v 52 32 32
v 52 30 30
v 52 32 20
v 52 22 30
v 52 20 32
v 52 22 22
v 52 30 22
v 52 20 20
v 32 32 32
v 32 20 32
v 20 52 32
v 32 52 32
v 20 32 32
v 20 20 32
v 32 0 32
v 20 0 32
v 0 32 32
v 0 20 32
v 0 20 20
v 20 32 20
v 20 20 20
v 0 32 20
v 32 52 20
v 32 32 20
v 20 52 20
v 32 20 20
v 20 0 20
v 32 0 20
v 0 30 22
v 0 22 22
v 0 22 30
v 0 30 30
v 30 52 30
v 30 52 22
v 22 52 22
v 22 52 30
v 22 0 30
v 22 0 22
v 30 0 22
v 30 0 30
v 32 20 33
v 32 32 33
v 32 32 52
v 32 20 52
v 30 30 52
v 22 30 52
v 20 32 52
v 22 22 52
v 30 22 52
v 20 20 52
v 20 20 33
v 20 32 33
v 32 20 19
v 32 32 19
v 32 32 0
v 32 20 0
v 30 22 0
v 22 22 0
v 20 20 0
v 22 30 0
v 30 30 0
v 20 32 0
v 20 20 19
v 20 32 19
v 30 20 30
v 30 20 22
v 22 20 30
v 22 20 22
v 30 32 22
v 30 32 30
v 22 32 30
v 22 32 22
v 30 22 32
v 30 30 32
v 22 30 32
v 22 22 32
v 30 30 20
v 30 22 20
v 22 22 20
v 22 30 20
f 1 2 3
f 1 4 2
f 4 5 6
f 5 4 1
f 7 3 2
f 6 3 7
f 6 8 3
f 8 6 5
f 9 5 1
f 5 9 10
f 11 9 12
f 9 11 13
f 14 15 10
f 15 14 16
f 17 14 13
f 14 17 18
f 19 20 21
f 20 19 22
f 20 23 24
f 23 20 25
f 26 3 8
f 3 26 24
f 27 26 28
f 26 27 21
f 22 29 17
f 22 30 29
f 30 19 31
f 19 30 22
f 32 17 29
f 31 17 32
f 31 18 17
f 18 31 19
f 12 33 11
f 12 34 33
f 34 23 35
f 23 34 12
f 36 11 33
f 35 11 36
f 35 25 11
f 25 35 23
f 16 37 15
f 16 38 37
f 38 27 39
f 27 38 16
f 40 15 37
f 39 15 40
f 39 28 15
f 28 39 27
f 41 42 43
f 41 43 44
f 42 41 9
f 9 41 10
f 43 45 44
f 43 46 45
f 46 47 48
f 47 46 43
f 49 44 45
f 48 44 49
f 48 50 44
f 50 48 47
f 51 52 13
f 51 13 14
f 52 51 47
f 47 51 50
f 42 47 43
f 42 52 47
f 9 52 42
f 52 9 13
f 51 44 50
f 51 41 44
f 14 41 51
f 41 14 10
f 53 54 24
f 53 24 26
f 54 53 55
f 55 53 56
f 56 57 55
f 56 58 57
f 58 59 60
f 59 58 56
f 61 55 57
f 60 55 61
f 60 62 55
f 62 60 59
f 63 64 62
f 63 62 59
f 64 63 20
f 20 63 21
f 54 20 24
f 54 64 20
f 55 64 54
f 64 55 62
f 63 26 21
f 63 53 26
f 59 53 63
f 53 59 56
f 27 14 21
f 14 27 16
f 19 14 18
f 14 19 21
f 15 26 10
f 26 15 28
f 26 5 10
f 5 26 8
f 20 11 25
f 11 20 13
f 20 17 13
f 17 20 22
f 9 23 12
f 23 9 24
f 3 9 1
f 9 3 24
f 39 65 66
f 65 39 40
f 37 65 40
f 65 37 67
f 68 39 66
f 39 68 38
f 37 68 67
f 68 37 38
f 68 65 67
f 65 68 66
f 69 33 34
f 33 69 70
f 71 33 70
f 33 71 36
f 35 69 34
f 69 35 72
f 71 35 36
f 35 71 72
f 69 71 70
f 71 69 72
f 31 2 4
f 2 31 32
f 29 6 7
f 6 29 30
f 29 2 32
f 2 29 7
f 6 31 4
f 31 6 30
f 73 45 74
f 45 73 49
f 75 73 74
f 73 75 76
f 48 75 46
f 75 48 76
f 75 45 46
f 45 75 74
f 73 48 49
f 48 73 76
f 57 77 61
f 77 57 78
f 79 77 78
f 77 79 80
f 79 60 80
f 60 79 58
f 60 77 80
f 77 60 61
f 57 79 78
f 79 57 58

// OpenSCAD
/* 
 * Universal connectors generator - rectangular version
 * See connectors type to choose from
 * all units are in milimeters
 *
 * author R. A. - 2015/12/01
 * e-mail: thingiverse@dexter.sk
 * Thingiverse username: dexterko
 *
 * Feel free to modify and distribute, but please keep the credits;-)
 */
    
    
outer_width = 12;
hole_width = 8;
connect_length = 20;
connector_type = "XX_conn"; // [I_conn:Bare I connector - 2 connects, L_conn:Flat L connector - 2 connects, T_conn:Flat T connector - 3 connects, X_conn:Flat X connector - 4 connects, LL_conn:Edge Connector - 3 connects, TT_conn:T Connector with side connect - 4 connects, XT_conn:X Connector with  side-connect - 5 connects, XX_conn:full 3D Cross Connector - 6 connects]

if (connector_type == "I_conn") {
    I_conn(outer_width, hole_width, connect_length);
} else if (connector_type == "L_conn") {
    L_conn(outer_width, hole_width, connect_length);
} else if (connector_type == "T_conn") {
    T_conn(outer_width, hole_width, connect_length);
} else if (connector_type == "X_conn") {
    X_conn(outer_width, hole_width, connect_length);
} else if (connector_type == "LL_conn") {
    LL_conn(outer_width, hole_width, connect_length);
} else if (connector_type == "TT_conn") {
    TT_conn(outer_width, hole_width, connect_length); 
} else if (connector_type == "XT_conn") {
    XT_conn(outer_width, hole_width, connect_length);
} else if (connector_type == "XX_conn") {
    XX_conn(outer_width, hole_width, connect_length);


}

module I_conn(outer_width, hole_width, connect_length) {
    difference() {
      cube([outer_width, outer_width, connect_length*2]);
      
      translate([(outer_width-hole_width)/2, (outer_width-hole_width)/2, 0])
      cube([hole_width, hole_width, connect_length*2]);
    }
}


module L_conn(outer_width, hole_width, connect_length) {
    difference() {
        union() {
            // Vertical connect
            translate([0, 0, outer_width])
            cube([outer_width, outer_width, connect_length]);
    
            // Edge connect - solid, no holes
            cube([outer_width, outer_width, outer_width]);
    
            // Horizontal connect
            rotate([90, 0, 0])
            translate([0, 0, 0])
            cube([outer_width, outer_width, connect_length]);
        }

        // Inner hole - vertical
        translate([(outer_width-hole_width)/2, (outer_width-hole_width)/2, outer_width])
        cube([hole_width, hole_width, connect_length]);
    
        // Inner hole - horizontal
        rotate([90, 0, 0])
        translate([(outer_width-hole_width)/2, (outer_width-hole_width)/2, 0])
        cube([hole_width, hole_width, connect_length]);
        }
    }

module T_conn(outer_width, hole_width, connect_length) {
    difference() {
        union() {
            // Vertical connect
            translate([0, 0, outer_width])
            cube([outer_width, outer_width, connect_length]);
    
            // Edge connect - solid, no holes
            // cube([outer_width, outer_width, outer_width]);
    
            // Horizontal connect
            rotate([90, 0, 0])
            translate([0, 0, 0-connect_length-outer_width])
            cube([outer_width, outer_width, connect_length*2+outer_width]);
        }

        // Inner hole - vertical
        translate([(outer_width-hole_width)/2, (outer_width-hole_width)/2, outer_width])
        cube([hole_width, hole_width, connect_length]);
    
        // Inner hole - horizontal
        rotate([90, 0, 0])
        translate([(outer_width-hole_width)/2, (outer_width-hole_width)/2, 0-connect_length-outer_width])
        cube([hole_width, hole_width, connect_length*2+outer_width]);
        }
    }    
    
    
module X_conn(outer_width, hole_width, connect_length) {
    difference() {
        cube([(connect_length*2)+outer_width, (connect_length*2)+outer_width, outer_width]);
        
        translate([-1,-1,-1])
        cube([connect_length+1,connect_length+1, outer_width+2]);
        
        translate([connect_length+outer_width, -1, -1])
        cube([connect_length+1, connect_length+1, outer_width+2]);
        
        translate([-1, connect_length+outer_width, -1])
        cube([connect_length+1, connect_length+1, outer_width+2]);
        
        translate([connect_length+outer_width, connect_length+outer_width, -1])
        cube([connect_length+1, connect_length+1, outer_width+2]);
        
        // Inner hole 1
        translate([connect_length+(outer_width-hole_width)/2, 0, (outer_width-hole_width)/2])
        cube([hole_width, connect_length, hole_width]);
    
        // Inner hole 2
        translate([connect_length+(outer_width-hole_width)/2, connect_length+outer_width, (outer_width-hole_width)/2])
        cube([hole_width, connect_length, hole_width]);
        
        // Inner hole 3(see through)
        translate([0, connect_length+((outer_width-hole_width)/2), (outer_width-hole_width)/2])
        cube([connect_length*2+outer_width, hole_width, hole_width]);
        }
    }    
    

module LL_conn(outer_width, hole_width, connect_length) {
    difference() {
        union() {
            cube([connect_length+outer_width, connect_length+outer_width, outer_width]);
            translate([connect_length, connect_length, outer_width])
            cube([outer_width, outer_width, connect_length]);
        }
        translate([-1,-1,-1])  
        cube([connect_length+1,connect_length+1, outer_width+2]);
        
        // Inner hole 1
        translate([connect_length+(outer_width-hole_width)/2, 0, (outer_width-hole_width)/2])
        cube([hole_width, connect_length, hole_width]);
        
        // Inner hole 2(see through)
        translate([0, connect_length+((outer_width-hole_width)/2), (outer_width-hole_width)/2])
        cube([connect_length, hole_width, hole_width]);
        
        translate([connect_length+(outer_width-hole_width)/2, connect_length+(outer_width-hole_width)/2, outer_width])
        cube([hole_width, hole_width, connect_length]);
        }
    }    
    
module TT_conn(outer_width, hole_width, connect_length) {
    difference() {
        union() {
            cube([(connect_length*2)+outer_width, connect_length+outer_width, outer_width]);
            translate([connect_length, connect_length, outer_width])
            cube([outer_width, outer_width, connect_length]);
        }
        translate([-1,-1,-1])    
        cube([connect_length+1,connect_length+1, outer_width+2]);
        
        translate([connect_length+outer_width, -1, -1])
        cube([connect_length+1, connect_length+1, outer_width+2]);
        
        // Inner hole 1
        translate([connect_length+(outer_width-hole_width)/2, 0, (outer_width-hole_width)/2])
        cube([hole_width, connect_length, hole_width]);
        
        // Inner hole 2(see through)
        translate([0, connect_length+((outer_width-hole_width)/2), (outer_width-hole_width)/2])
        cube([connect_length*2+outer_width, hole_width, hole_width]);
        
        translate([connect_length+(outer_width-hole_width)/2, connect_length+(outer_width-hole_width)/2, outer_width])
            cube([hole_width, hole_width, connect_length]);
        }
    }    
    
module XT_conn(outer_width, hole_width, connect_length) {
    difference() {
        union() {
            cube([(connect_length*2)+outer_width, (connect_length*2)+outer_width, outer_width]);
            translate([connect_length, connect_length, outer_width])
            cube([outer_width, outer_width, connect_length]);
        }
        translate([-1,-1,-1])
        cube([connect_length+1,connect_length+1, outer_width+2]);
        
        translate([connect_length+outer_width, -1, -1])
        cube([connect_length+1, connect_length+1, outer_width+2]);
        
        translate([-1, connect_length+outer_width, -1])
        cube([connect_length+1, connect_length+1, outer_width+2]);
        
        translate([connect_length+outer_width, connect_length+outer_width, -1])
        cube([connect_length+1, connect_length+1, outer_width+2]);
        
        // Inner hole 1
        translate([connect_length+(outer_width-hole_width)/2, 0, (outer_width-hole_width)/2])
        cube([hole_width, connect_length, hole_width]);
    
        // Inner hole 2
        translate([connect_length+(outer_width-hole_width)/2, connect_length+outer_width, (outer_width-hole_width)/2])
        cube([hole_width, connect_length, hole_width]);
        
        // Inner hole 3(see through)
        translate([0, connect_length+((outer_width-hole_width)/2), (outer_width-hole_width)/2])
        cube([connect_length*2+outer_width, hole_width, hole_width]);
        
        translate([connect_length+(outer_width-hole_width)/2, connect_length+(outer_width-hole_width)/2, outer_width])
            cube([hole_width, hole_width, connect_length]);
        }
    }    
    
module XX_conn(outer_width, hole_width, connect_length) {
    difference() {
        union() {
            translate([0, 0, connect_length])
            cube([(connect_length*2)+outer_width, (connect_length*2)+outer_width, outer_width]);
            
            translate([connect_length, connect_length, connect_length+outer_width])
            cube([outer_width, outer_width, connect_length]);
            
            translate([connect_length, connect_length, 0])
            cube([outer_width, outer_width, connect_length]);
        } 
        translate([-1, -1, connect_length-1])
        cube([connect_length+1,connect_length+1, outer_width+2]);
        
        translate([connect_length+outer_width, -1, connect_length-1])
        cube([connect_length+1, connect_length+1, outer_width+2]);
        
        translate([-1, connect_length+outer_width, connect_length-1])
        cube([connect_length+1, connect_length+1, outer_width+2]);
        
        translate([connect_length+outer_width, connect_length+outer_width, connect_length-1])
        cube([connect_length+1, connect_length+1, outer_width+2]);
        
        // Inner hole 1
        translate([connect_length+(outer_width-hole_width)/2, 0, (outer_width-hole_width)/2+connect_length])
        cube([hole_width, connect_length, hole_width]);
    
        // Inner hole 2
        translate([connect_length+(outer_width-hole_width)/2, connect_length+outer_width, (outer_width-hole_width)/2+connect_length])
        cube([hole_width, connect_length, hole_width]);
        
        // Inner hole 3(see through)
        translate([0, connect_length+((outer_width-hole_width)/2), (outer_width-hole_width)/2+connect_length])
        cube([connect_length*2+outer_width, hole_width, hole_width]);
        
        // Inner hole 4
        translate([connect_length+(outer_width-hole_width)/2, connect_length+(outer_width-hole_width)/2, connect_length+outer_width])
        cube([hole_width, hole_width, connect_length]);
            
        // Inner hole 5
        translate([connect_length+(outer_width-hole_width)/2, connect_length+(outer_width-hole_width)/2, 0])
        cube([hole_width, hole_width, connect_length]);
        }
    }    
    
